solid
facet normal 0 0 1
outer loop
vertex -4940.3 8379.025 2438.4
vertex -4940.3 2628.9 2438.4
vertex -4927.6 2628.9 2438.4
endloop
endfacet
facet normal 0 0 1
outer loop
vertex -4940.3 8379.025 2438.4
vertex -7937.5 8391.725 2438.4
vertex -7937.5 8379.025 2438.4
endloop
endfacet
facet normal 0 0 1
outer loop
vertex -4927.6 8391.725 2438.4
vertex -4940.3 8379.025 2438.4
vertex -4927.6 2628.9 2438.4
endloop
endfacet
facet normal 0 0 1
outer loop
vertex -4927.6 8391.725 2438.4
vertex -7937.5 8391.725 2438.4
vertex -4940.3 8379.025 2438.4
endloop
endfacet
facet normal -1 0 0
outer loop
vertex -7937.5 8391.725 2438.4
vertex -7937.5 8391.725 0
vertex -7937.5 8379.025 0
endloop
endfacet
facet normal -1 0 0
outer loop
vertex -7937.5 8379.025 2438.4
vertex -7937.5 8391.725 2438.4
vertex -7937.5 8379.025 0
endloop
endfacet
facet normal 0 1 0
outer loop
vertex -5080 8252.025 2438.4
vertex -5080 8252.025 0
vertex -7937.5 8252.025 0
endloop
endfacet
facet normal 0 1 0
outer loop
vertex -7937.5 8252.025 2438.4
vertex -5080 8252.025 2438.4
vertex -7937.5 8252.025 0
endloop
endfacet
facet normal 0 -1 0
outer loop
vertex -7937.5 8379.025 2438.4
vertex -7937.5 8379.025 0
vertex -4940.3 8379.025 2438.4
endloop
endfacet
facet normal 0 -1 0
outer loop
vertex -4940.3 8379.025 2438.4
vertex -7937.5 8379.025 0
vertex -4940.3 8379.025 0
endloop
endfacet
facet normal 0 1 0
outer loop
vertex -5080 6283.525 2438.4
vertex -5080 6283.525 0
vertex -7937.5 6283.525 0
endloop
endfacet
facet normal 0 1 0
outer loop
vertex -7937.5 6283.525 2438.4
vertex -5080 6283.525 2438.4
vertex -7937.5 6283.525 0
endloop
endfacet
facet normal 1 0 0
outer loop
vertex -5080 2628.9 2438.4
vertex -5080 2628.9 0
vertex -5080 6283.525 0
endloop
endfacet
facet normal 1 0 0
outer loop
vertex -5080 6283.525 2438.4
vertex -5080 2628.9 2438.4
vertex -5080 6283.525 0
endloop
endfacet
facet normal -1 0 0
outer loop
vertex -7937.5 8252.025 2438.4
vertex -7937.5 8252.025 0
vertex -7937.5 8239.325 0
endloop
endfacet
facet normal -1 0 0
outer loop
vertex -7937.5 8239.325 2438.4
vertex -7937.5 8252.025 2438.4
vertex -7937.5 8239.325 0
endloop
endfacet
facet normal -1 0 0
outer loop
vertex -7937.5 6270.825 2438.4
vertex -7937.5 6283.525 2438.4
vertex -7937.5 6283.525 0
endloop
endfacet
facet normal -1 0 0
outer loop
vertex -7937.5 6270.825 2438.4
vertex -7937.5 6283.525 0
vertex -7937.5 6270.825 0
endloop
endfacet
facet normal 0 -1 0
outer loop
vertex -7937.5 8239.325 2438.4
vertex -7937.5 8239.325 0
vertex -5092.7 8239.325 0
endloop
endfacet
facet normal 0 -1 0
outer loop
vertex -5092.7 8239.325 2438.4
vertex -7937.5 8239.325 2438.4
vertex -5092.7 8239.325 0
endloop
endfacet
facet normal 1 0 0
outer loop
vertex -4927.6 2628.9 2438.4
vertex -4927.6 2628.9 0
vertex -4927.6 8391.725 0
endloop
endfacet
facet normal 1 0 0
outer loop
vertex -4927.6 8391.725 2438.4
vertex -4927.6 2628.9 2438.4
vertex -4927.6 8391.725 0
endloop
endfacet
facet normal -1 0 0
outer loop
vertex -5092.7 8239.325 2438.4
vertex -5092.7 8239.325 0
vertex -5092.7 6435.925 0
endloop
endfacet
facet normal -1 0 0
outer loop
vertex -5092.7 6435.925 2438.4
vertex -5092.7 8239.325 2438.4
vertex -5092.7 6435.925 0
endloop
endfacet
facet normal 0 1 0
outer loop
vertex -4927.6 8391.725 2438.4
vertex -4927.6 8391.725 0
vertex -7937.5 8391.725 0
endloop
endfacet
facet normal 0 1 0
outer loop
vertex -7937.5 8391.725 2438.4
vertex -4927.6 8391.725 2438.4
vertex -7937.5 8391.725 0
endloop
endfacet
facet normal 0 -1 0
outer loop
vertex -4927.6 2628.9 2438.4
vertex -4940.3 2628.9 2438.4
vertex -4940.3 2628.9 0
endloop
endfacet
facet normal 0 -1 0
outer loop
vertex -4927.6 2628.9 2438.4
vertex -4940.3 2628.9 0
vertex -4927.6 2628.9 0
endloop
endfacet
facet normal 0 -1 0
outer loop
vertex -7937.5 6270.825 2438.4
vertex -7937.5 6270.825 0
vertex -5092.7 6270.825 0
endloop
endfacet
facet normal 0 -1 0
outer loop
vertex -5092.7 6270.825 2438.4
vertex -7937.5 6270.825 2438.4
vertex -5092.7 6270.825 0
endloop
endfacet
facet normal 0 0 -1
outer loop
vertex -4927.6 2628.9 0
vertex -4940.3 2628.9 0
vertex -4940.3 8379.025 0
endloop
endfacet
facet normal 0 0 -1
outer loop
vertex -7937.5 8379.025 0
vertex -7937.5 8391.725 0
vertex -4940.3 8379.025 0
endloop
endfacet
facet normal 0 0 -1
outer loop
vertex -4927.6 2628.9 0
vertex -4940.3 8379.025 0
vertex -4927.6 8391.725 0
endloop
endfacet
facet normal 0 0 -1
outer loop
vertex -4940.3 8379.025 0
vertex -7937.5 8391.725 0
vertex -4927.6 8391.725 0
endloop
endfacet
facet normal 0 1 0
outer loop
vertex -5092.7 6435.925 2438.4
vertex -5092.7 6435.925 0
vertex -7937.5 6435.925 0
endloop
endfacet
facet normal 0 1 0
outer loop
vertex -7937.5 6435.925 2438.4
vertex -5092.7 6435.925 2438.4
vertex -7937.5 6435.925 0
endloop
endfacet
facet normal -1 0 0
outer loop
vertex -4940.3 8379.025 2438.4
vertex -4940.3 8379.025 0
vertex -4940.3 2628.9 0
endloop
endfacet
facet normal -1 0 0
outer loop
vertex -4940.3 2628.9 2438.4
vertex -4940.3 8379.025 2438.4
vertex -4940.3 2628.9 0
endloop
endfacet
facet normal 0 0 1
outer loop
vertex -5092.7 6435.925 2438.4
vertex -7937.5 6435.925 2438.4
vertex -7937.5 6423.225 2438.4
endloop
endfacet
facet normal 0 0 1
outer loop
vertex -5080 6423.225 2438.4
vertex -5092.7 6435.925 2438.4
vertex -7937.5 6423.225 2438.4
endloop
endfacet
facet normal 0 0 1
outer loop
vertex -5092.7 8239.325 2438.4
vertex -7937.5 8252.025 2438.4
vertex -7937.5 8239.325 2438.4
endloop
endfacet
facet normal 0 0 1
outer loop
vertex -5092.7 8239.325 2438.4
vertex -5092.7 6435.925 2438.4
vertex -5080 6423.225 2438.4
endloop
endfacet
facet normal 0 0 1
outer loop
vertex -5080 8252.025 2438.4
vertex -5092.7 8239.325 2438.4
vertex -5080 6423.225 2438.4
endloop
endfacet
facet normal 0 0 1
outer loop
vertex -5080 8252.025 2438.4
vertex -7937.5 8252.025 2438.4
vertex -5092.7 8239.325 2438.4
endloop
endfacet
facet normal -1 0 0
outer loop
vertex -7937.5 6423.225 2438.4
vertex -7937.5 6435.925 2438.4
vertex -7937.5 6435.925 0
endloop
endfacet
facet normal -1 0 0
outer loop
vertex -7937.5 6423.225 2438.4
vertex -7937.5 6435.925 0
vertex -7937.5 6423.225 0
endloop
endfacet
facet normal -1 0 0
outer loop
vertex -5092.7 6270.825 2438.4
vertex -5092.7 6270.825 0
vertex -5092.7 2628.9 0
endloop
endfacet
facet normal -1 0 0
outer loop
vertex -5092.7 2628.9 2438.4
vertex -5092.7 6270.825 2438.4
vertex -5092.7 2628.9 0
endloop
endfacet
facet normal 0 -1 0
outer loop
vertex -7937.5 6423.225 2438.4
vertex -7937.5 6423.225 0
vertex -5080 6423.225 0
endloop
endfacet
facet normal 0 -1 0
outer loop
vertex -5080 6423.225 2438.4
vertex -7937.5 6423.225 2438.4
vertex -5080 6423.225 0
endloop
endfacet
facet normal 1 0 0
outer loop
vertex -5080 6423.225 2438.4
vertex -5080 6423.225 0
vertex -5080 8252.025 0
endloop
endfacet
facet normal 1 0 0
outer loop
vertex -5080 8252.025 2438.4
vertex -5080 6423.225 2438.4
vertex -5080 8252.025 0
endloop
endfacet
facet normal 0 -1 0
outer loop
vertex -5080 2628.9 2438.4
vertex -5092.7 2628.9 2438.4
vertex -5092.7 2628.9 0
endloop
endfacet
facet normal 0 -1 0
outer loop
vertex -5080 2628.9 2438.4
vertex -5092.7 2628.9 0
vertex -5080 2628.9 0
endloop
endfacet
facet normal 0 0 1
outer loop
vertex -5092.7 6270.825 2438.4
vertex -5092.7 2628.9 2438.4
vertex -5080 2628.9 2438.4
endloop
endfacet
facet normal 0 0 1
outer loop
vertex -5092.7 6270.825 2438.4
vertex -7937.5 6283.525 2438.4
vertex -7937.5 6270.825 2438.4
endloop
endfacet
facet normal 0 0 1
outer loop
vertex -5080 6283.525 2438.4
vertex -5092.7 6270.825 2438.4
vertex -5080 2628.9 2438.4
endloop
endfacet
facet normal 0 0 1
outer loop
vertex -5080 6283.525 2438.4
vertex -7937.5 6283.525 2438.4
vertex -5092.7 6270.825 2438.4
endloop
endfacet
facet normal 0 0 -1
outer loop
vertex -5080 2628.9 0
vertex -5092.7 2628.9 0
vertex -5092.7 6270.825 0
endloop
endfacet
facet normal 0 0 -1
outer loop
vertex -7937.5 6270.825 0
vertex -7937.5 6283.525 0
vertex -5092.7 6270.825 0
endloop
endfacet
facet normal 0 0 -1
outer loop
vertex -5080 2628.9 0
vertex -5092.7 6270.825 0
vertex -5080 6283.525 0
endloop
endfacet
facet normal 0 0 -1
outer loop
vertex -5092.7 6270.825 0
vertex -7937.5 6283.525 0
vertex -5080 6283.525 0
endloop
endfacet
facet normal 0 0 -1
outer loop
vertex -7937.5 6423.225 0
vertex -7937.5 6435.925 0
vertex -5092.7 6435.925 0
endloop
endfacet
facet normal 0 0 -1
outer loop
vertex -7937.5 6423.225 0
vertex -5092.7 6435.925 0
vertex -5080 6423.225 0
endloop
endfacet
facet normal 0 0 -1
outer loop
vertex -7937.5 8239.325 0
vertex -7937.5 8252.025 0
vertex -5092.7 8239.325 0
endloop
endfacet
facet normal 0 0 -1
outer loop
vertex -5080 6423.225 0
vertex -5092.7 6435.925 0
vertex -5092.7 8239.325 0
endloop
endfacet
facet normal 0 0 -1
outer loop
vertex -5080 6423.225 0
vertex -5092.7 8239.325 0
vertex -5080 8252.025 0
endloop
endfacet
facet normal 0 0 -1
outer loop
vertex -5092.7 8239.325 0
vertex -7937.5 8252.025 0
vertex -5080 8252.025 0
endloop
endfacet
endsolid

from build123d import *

# Parameters (mm, degrees)
F1_DEPTH  = 2578.1
F2_T      = -203.2
F3_W      = 1219.2
F3_H      = 1422.4
F5_DEPTH  = 203.2
F4_W      = 139.7
F4_H      = 38.1
F4_W_2    = 38.1
F4_H_2    = 139.7
F6_DEPTH  = 2349.5
F8_DEPTH  = 2438.4
F9_DEPTH  = 152.4
F11_DEPTH = 12.7
F14_DEPTH = 2438.4


with BuildPart() as f1:
    # F0 (on Top) → F1 (new body)
    with BuildSketch(Plane.XY):
        Polygon((-2286, 16078.2), (-8280.4, 16078.2), (-8280.4, 13922.375), (-9406.501324, 13223.08125), (-9406.501324, 8900.31875), (-8280.4, 8201.025), (-8280.4, 2286), (-5283.2, 2286), (-5283.2, 0), (0, 0), (0, 7162.8), (-2286, 7162.8), align=None)
    extrude(amount=F1_DEPTH)

    # F2
    f2_openings = [f1.faces().sort_by_distance(p)[0] for p in [
        (-4762.628229, 7961.579676, 2578.1),
    ]]
    offset(amount=F2_T, openings=f2_openings)

    # F3 (on face) → F5 (cut, through all)
    with BuildSketch(Plane(origin=(0, 2489.2, 0), x_dir=(-1, 0, 0), z_dir=(0, 1, 0))):
        with Locations((6578.6, 1612.9)):
            Rectangle(F3_W, F3_H)
    extrude(amount=-F5_DEPTH, mode=Mode.SUBTRACT)

    # F4 (on face) → F6 (join)
    with BuildSketch(Plane.XY.offset(203.2)):
        with Locations((-8007.35, 13830.957576)):
            Rectangle(F4_W, F4_H)
        with Locations((-7915.91, 15805.15)):
            Rectangle(F4_W_2, F4_H_2)
        with Locations((-8007.35, 15713.71)):
            Rectangle(F4_W, F4_H)
        with Locations((-2650.49, 15805.15)):
            Rectangle(F4_W_2, F4_H_2)
        with Locations((-2559.05, 15713.71)):
            Rectangle(F4_W, F4_H)
        Polygon((-8004.521439, 13690.055561), (-8078.219463, 13808.734503), (-8110.586447, 13788.635042), (-8036.888423, 13669.9561), align=None)
        with Locations((-9133.451324, 12650.420544)):
            Rectangle(F4_W, F4_H)
        Polygon((-9129.93616, 13155.632604), (-9162.303144, 13135.533143), (-9088.60512, 13016.854201), (-9056.238136, 13036.953662), align=None)
        Polygon((-9116.524442, 9061.586174), (-9162.303144, 8987.866857), (-9129.93616, 8967.767396), (-9071.675963, 9061.586174), align=None)
        Polygon((-9203.301324, 9061.586174), (-9116.524442, 9061.586174), (-9092.864855, 9099.686174), (-9203.301324, 9099.686174), align=None)
        Polygon((-9088.60512, 9106.545799), (-9092.864855, 9099.686174), (-9077.558786, 9099.686174), align=None)
        Polygon((-9063.601324, 9074.589095), (-9071.675963, 9061.586174), (-9063.601324, 9061.586174), align=None)
        Polygon((-9063.601324, 9099.686174), (-9077.558786, 9099.686174), (-9063.601324, 9091.018778), align=None)
        Polygon((-9063.601324, 9091.018778), (-9063.601324, 9074.589095), (-9056.238136, 9086.446338), align=None)
        Polygon((-8035.86896, 8452.810827), (-8109.566984, 8334.131885), (-8077.2, 8314.032424), (-8003.501976, 8432.711366), align=None)
        with Locations((-8007.35, 8292.442424)):
            Rectangle(F4_W, F4_H)
        with Locations((-8007.35, 2650.49)):
            Rectangle(F4_W, F4_H)
        with Locations((-7915.91, 2559.05)):
            Rectangle(F4_W_2, F4_H_2)
        with Locations((-5101.59, 2559.05)):
            Rectangle(F4_W_2, F4_H_2)
        with Locations((-5010.15, 2467.61)):
            Rectangle(F4_W, F4_H)
        with Locations((-5010.15, 364.49)):
            Rectangle(F4_W, F4_H)
        with Locations((-4918.71, 273.05)):
            Rectangle(F4_W_2, F4_H_2)
        with Locations((-364.49, 273.05)):
            Rectangle(F4_W_2, F4_H_2)
        with Locations((-273.05, 364.49)):
            Rectangle(F4_W, F4_H)
        with Locations((-273.05, 6798.31)):
            Rectangle(F4_W, F4_H)
        with Locations((-364.49, 6889.75)):
            Rectangle(F4_W_2, F4_H_2)
    extrude(amount=F6_DEPTH)


with BuildPart() as f8:
    # F7 (on face) → F8 (new body)
    with BuildSketch(Plane.XY.offset(203.2)):
        Polygon((-9063.601324, 9091.018778), (-7937.5, 8391.725028), (-7937.5, 2641.6), (-7937.5, 2628.9), (-7924.8, 2628.9), (-4940.3, 2628.9), (-4940.3, 355.6), (-4940.3, 342.9), (-4927.6, 342.9), (-355.6, 342.9), (-342.9, 342.9), (-342.9, 355.6), (-342.9, 6019.579635), (-355.6, 6019.579635), (-355.6, 355.6), (-4927.6, 355.6), (-4927.6, 2628.9), (-4927.6, 2641.6), (-4940.3, 2641.6), (-7924.8, 2641.6), (-7924.8, 8391.725028), (-7924.8, 8398.787992), (-9050.901324, 9098.081742), (-9050.901324, 13025.318258), (-7924.8, 13724.612008), (-7924.8, 15722.6), (-2641.6, 15722.6), (-2641.6, 11339.577675), (-2628.9, 11339.577675), (-2628.9, 15735.3), (-7937.5, 15735.3), (-7937.5, 13731.674972), (-9063.601324, 13032.381222), align=None)
    extrude(amount=F8_DEPTH)

    # F3 (on face) → F9 (cut, through all)
    with BuildSketch(Plane(origin=(0, 2489.2, 0), x_dir=(-1, 0, 0), z_dir=(0, 1, 0))):
        with Locations((6578.6, 1612.9)):
            Rectangle(F3_W, F3_H)
    extrude(amount=F9_DEPTH, mode=Mode.SUBTRACT)


with BuildPart() as f11:
    # F10 (on Top) → F11 (new body)
    with BuildSketch(Plane.XY):
        Polygon((-8077.2, 8314.032424), (-8077.2, 2489.2), (-5080, 2489.2), (-5080, 203.2), (-203.2, 203.2), (-203.2, 5526.424885), (-342.9, 5526.424885), (-342.9, 342.9), (-4940.3, 342.9), (-4940.3, 2628.9), (-7937.5, 2628.9), (-7937.5, 8391.725028), (-9063.601324, 9091.018778), (-9063.601324, 13032.381222), (-7937.5, 13731.674972), (-7937.5, 15735.3), (-2628.9, 15735.3), (-2628.9, 11339.577675), (-2489.2, 11339.577675), (-2489.2, 15875), (-8077.2, 15875), (-8077.2, 13809.367576), (-9203.301324, 13110.073826), (-9203.301324, 9013.326174), align=None)
    extrude(amount=F11_DEPTH)


with BuildPart() as f14:
    # F13 (on Top) → F14 (new body)
    with BuildSketch(Plane.XY):
        Polygon((-5092.7, 2628.9), (-5080, 2628.9), (-5080, 6270.825028), (-5080, 6283.525028), (-5092.7, 6283.525028), (-7937.5, 6283.525028), (-7937.5, 6270.825028), (-5092.7, 6270.825028), align=None)
        Polygon((-7937.5, 6435.925028), (-7937.5, 6423.225028), (-5092.7, 6423.225028), (-5080, 6423.225028), (-5080, 6435.925028), (-5080, 8239.325028), (-5080, 8252.025028), (-5092.7, 8252.025028), (-7937.5, 8252.025028), (-7937.5, 8239.325028), (-5092.7, 8239.325028), (-5092.7, 6435.925028), align=None)
        Polygon((-4940.3, 8379.025028), (-4940.3, 2628.9), (-4927.6, 2628.9), (-4927.6, 8379.025028), (-4927.6, 8391.725028), (-4940.3, 8391.725028), (-7937.5, 8391.725028), (-7937.5, 8379.025028), align=None)
    extrude(amount=F14_DEPTH)


solid = f14.part
